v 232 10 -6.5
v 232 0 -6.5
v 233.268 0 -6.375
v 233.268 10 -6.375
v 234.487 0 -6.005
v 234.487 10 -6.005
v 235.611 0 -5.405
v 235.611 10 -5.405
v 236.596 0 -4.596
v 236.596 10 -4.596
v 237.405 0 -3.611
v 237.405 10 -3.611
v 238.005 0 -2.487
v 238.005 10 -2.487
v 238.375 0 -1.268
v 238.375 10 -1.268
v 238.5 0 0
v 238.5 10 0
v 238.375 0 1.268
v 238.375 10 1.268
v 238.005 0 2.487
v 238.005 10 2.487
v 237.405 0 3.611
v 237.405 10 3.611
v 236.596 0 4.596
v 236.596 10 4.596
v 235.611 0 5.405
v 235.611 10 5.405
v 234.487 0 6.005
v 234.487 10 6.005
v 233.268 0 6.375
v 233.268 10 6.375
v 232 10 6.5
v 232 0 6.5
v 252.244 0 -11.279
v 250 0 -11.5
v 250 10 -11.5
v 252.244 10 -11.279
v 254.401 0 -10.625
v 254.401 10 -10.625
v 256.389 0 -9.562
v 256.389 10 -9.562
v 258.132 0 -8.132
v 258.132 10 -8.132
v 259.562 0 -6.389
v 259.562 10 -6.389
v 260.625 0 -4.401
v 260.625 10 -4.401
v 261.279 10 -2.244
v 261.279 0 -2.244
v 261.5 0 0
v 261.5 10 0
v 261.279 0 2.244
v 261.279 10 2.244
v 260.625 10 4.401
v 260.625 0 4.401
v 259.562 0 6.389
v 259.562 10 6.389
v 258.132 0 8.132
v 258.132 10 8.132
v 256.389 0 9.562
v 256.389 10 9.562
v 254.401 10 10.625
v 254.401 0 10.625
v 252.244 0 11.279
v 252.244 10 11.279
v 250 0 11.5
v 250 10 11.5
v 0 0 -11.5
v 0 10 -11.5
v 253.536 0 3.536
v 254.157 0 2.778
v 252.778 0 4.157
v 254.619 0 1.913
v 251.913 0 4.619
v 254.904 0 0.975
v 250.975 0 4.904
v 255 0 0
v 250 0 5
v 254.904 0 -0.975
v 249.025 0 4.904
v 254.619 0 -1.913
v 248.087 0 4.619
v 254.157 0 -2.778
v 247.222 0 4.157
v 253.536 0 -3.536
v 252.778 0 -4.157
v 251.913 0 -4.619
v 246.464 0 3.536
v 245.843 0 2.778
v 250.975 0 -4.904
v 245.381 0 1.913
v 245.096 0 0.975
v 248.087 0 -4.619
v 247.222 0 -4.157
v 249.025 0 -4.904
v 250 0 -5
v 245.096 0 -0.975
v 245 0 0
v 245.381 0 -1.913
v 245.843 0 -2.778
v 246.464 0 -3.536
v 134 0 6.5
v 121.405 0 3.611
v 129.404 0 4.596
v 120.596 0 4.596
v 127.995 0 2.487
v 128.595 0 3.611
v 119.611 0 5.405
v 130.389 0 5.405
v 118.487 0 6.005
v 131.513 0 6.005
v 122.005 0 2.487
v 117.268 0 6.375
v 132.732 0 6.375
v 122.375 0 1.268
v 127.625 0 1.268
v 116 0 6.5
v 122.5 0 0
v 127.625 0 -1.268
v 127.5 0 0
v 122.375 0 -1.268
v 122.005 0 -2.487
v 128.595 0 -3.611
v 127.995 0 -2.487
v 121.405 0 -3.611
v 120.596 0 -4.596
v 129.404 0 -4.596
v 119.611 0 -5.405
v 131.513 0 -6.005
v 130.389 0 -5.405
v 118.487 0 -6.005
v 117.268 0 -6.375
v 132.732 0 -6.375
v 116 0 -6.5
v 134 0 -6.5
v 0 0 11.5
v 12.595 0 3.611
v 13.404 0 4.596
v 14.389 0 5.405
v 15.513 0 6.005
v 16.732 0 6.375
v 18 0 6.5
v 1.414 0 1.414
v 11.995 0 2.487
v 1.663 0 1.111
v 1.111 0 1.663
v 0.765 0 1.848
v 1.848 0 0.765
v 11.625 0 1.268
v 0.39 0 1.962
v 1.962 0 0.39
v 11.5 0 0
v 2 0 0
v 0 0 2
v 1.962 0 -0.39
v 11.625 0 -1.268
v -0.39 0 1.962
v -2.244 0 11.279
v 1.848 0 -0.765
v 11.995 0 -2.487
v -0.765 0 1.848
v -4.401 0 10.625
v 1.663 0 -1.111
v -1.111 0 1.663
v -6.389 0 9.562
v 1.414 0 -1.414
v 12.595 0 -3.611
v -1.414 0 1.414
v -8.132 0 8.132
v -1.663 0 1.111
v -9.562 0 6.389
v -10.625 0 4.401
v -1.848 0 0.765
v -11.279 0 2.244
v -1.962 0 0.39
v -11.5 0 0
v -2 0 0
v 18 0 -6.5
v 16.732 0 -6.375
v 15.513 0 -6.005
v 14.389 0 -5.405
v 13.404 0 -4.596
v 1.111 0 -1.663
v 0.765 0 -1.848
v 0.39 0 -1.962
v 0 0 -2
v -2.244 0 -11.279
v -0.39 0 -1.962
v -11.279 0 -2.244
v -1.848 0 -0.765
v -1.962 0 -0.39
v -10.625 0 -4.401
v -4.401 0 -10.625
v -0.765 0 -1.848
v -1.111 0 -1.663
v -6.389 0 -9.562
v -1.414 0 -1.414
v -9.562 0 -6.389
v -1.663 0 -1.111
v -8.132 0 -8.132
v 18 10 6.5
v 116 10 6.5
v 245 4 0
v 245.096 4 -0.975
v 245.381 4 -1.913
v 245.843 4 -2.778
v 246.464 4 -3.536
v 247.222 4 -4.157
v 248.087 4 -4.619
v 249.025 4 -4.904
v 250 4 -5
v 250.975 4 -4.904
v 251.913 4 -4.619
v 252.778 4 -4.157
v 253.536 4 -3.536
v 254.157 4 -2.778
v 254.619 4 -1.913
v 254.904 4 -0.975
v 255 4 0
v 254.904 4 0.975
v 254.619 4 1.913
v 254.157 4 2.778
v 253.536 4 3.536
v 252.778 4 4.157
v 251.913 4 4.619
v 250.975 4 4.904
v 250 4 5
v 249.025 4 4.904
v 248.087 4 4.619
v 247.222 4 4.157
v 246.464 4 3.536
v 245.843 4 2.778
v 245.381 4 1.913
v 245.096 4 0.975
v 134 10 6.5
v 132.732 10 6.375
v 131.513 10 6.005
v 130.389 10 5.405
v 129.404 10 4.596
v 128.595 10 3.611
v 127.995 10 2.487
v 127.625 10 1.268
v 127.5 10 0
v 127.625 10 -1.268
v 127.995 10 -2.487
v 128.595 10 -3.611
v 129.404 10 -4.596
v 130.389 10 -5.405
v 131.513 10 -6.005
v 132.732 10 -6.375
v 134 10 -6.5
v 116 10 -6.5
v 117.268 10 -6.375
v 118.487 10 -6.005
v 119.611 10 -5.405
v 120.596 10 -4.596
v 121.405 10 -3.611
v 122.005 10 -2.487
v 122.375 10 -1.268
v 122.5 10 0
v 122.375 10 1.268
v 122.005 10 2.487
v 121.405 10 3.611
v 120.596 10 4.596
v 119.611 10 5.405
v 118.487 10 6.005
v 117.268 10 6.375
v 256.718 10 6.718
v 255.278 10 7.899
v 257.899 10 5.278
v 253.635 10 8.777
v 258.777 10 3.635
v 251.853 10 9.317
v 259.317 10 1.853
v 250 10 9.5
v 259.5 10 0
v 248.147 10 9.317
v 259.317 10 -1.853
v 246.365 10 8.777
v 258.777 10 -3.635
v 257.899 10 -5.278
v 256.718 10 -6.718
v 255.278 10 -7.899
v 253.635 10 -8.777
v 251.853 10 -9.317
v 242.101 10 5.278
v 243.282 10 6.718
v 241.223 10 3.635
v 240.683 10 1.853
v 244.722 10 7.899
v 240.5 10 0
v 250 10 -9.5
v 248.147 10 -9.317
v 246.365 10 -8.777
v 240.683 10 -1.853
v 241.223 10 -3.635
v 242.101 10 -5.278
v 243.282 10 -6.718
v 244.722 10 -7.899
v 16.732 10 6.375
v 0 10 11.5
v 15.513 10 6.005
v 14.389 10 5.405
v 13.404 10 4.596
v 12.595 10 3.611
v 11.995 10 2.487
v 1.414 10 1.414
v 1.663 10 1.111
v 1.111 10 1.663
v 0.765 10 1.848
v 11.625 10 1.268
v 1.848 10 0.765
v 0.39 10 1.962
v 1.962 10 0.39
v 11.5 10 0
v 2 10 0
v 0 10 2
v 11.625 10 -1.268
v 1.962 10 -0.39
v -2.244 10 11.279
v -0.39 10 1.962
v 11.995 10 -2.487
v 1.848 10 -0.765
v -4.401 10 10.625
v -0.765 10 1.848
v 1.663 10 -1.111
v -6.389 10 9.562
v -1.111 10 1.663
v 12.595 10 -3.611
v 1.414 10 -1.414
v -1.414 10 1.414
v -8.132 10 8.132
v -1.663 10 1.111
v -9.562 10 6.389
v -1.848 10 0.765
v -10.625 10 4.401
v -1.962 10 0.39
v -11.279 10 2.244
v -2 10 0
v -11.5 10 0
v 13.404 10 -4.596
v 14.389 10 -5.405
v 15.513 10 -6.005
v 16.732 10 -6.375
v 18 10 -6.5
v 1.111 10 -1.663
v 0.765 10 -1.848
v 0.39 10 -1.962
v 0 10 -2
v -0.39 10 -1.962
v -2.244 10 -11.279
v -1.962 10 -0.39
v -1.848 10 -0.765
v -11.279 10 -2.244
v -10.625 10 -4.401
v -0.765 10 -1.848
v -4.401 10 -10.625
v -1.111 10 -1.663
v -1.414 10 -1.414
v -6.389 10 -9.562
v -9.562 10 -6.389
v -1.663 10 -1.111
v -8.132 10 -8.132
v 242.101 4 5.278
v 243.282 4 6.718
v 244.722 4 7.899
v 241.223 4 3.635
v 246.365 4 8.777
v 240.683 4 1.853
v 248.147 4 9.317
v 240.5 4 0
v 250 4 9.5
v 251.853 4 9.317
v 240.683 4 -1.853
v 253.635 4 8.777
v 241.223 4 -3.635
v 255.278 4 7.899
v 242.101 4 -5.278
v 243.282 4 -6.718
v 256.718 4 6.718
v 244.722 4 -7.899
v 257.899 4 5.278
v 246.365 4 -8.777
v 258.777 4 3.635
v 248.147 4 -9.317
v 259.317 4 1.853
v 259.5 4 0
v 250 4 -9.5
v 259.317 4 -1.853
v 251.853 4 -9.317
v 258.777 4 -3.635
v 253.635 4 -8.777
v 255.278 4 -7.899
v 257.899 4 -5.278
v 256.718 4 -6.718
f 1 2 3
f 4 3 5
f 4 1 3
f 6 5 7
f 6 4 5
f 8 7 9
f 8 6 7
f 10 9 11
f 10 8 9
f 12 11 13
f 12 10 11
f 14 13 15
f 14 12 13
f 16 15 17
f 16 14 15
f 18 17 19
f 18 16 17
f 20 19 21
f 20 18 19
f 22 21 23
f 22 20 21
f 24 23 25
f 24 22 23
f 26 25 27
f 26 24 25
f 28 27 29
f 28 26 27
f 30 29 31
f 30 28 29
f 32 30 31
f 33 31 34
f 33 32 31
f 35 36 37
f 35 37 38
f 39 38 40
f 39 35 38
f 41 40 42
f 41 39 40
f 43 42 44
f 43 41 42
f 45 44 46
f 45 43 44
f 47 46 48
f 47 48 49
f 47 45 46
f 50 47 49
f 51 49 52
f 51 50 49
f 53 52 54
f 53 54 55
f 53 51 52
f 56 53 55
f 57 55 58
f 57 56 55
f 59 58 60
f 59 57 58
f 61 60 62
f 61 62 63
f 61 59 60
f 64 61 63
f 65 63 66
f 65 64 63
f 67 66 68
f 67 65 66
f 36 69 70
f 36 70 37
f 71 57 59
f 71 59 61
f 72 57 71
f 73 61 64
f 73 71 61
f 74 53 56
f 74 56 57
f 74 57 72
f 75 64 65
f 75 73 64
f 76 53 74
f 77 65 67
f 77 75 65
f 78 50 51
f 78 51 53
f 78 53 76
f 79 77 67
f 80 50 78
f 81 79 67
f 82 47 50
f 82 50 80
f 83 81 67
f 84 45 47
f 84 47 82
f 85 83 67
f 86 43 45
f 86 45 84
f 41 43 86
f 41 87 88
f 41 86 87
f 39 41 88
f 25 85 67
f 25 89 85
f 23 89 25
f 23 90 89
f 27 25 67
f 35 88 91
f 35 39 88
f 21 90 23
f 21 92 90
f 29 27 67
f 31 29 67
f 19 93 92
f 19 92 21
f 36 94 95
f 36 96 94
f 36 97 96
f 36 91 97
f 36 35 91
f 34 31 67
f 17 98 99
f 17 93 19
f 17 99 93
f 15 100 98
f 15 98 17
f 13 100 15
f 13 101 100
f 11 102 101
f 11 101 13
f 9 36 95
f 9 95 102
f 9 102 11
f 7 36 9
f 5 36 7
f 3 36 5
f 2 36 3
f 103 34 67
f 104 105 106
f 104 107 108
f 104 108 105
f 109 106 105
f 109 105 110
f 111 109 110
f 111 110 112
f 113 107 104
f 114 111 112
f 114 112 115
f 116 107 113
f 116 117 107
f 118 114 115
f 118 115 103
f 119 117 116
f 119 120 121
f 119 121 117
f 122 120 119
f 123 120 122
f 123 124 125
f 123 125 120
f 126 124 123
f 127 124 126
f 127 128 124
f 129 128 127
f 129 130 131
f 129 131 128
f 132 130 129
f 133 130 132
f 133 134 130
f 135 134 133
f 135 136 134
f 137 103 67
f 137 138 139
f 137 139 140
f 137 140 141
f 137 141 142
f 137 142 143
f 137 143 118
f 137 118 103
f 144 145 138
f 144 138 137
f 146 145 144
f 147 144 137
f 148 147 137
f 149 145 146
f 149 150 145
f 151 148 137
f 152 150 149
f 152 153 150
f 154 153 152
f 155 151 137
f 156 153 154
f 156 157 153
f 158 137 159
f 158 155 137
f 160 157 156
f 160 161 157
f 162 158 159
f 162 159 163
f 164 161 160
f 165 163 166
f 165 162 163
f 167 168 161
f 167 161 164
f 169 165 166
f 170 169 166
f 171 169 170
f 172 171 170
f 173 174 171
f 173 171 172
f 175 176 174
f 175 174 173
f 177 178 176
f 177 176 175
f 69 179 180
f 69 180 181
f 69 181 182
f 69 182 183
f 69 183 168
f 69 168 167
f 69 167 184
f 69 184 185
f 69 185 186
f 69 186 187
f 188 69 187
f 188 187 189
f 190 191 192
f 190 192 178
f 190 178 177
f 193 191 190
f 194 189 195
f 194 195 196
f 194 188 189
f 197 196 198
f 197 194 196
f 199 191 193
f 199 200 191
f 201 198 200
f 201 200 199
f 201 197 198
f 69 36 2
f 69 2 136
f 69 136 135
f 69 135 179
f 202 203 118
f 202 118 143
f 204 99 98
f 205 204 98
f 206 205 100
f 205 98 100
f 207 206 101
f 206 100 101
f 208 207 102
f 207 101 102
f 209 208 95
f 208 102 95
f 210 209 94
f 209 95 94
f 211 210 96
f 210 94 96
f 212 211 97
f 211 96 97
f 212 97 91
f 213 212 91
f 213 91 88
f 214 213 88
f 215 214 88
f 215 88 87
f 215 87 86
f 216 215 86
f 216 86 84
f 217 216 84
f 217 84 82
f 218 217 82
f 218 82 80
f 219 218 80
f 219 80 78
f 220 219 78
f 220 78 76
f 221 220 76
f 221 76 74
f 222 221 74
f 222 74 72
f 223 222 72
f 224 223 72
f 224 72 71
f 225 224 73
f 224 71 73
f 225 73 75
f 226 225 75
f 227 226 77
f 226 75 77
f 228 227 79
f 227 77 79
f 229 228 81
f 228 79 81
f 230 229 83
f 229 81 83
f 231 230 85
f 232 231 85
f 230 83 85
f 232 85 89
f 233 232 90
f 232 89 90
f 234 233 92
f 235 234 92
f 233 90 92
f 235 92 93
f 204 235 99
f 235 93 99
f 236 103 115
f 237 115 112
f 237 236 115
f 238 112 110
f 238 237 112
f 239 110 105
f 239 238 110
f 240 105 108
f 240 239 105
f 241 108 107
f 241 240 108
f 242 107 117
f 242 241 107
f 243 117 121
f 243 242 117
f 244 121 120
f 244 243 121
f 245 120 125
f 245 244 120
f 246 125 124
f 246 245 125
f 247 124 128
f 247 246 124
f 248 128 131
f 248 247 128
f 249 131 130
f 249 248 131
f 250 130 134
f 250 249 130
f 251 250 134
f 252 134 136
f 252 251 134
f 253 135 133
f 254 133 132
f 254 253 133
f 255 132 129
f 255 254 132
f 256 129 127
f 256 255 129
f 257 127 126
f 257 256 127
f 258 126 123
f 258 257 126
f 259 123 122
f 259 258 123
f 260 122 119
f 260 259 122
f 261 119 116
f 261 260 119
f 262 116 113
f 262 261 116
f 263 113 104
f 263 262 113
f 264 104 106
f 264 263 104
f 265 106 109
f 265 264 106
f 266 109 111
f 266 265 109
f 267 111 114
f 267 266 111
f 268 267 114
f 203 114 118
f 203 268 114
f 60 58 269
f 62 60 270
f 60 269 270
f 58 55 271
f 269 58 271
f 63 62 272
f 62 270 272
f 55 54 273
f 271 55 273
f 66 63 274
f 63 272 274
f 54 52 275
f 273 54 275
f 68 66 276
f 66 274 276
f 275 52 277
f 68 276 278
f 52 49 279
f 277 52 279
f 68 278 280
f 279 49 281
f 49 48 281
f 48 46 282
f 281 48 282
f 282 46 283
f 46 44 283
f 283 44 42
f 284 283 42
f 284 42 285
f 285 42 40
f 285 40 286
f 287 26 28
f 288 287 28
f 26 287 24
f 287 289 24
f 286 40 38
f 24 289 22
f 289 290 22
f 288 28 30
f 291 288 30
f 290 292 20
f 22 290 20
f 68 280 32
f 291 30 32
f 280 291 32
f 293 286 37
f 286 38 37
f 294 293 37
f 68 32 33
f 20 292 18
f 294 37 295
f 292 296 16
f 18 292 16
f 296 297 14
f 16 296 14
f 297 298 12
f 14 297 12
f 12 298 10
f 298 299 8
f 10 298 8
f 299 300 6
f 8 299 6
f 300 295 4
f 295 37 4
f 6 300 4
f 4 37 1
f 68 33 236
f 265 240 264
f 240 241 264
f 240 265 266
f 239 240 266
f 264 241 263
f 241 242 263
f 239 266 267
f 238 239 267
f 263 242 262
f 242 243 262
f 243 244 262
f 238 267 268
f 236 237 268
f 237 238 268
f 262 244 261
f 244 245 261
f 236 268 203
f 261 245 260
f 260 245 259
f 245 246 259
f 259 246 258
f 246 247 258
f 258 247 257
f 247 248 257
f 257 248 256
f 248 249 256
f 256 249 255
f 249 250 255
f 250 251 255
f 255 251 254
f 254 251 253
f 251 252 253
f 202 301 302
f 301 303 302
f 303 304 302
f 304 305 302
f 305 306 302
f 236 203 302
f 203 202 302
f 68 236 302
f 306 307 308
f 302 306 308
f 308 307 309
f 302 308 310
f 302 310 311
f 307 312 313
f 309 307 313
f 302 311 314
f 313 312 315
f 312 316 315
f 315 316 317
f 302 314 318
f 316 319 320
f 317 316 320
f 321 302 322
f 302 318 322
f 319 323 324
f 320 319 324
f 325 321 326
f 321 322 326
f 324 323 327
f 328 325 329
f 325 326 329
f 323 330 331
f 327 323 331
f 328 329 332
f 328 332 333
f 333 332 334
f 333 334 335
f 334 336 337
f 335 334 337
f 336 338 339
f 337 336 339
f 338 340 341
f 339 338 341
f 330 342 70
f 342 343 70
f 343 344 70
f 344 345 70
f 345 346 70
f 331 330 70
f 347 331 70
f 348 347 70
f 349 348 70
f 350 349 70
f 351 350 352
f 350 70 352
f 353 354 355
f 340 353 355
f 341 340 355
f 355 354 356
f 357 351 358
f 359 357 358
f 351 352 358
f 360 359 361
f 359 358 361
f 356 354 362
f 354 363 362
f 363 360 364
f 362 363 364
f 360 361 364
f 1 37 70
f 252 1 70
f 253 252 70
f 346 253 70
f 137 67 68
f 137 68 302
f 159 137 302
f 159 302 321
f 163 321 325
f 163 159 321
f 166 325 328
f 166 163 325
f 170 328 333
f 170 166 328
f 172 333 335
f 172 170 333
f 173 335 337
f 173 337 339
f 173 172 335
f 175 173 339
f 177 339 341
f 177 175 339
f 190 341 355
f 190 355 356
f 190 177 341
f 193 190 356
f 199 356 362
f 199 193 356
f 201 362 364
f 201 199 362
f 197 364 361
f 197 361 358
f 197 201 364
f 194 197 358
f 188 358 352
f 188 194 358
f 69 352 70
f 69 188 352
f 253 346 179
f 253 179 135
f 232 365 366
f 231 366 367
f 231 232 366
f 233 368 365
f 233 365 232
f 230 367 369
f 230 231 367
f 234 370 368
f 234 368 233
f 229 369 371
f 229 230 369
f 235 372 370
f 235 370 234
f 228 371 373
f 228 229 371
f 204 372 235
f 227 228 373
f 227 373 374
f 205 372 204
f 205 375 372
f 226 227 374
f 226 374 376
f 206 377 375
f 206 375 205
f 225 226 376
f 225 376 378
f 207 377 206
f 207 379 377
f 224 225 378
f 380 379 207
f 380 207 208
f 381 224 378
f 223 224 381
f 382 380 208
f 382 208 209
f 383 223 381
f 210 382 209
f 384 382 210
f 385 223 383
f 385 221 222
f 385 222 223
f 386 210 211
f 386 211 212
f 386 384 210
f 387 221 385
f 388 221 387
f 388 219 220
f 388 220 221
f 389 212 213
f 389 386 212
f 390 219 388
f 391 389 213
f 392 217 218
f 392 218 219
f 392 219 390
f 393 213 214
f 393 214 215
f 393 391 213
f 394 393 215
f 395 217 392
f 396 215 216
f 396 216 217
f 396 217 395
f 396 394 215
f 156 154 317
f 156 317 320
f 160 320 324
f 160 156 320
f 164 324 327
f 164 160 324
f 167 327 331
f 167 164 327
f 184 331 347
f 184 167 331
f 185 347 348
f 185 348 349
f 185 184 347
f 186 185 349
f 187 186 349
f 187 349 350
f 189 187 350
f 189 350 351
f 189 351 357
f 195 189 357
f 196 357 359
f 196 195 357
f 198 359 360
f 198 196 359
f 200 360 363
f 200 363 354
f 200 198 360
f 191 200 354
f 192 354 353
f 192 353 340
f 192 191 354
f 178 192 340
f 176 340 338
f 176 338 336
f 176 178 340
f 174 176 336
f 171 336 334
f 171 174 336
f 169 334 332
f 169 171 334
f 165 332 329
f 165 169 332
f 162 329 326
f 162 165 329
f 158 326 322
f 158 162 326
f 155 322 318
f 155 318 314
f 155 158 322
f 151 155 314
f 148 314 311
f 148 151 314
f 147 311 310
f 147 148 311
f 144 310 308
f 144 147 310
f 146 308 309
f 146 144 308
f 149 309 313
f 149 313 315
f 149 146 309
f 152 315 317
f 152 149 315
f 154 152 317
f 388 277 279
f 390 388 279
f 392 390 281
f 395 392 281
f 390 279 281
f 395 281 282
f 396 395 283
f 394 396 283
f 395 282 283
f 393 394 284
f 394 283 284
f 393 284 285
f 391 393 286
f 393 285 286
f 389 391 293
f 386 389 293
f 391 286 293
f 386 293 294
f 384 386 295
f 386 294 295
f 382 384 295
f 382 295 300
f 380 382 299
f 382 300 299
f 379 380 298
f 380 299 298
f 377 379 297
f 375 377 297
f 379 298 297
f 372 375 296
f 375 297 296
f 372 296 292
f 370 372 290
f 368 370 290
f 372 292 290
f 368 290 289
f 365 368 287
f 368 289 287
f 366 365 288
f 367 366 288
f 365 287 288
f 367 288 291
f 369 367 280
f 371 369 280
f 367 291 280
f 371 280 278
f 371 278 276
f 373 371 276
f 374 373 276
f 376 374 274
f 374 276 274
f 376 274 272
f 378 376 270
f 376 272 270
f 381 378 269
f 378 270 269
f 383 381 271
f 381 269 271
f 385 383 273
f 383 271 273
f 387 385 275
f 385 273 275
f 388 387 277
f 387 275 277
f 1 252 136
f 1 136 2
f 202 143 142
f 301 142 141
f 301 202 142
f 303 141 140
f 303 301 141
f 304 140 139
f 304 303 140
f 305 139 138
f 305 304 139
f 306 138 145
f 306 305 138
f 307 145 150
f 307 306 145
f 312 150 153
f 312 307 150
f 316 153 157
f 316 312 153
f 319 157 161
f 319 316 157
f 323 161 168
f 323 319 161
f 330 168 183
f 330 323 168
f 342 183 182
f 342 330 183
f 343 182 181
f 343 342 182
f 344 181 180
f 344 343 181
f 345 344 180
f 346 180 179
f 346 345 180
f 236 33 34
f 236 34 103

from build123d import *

# Parameters (mm, degrees)
SKETCH1_R           = 2
BOSS_EXTRUDE1_DEPTH = 10
SKETCH2_R           = 9.5
CUT_EXTRUDE1_DEPTH  = 6
SKETCH3_R           = 5
CUT_EXTRUDE2_DEPTH  = 11
CUT_EXTRUDE3_DEPTH  = 11


with BuildPart() as part:
    # Sketch1 → Boss-Extrude1 (new body)
    with BuildSketch(Plane(origin=(0, 0, 0), x_dir=(1, 0, 0), z_dir=(0, 1, 0))):
        with BuildLine():
            Line((0, 11.5), (250, 11.5))
            ThreePointArc((250, 11.5), (261.5, 0), (250, -11.5))
            Line((250, -11.5), (0, -11.5))
            ThreePointArc((0, -11.5), (-11.5, 0), (0, 11.5))
        make_face()
        Circle(SKETCH1_R, mode=Mode.SUBTRACT)
    extrude(amount=BOSS_EXTRUDE1_DEPTH)

    # Sketch2 → Cut-Extrude1 (cut)
    with BuildSketch(Plane(origin=(0, 10, 0), x_dir=(1, 0, 0), z_dir=(0, 1, 0))):
        with Locations((250, 0)):
            Circle(SKETCH2_R)
    extrude(amount=-CUT_EXTRUDE1_DEPTH, mode=Mode.SUBTRACT)

    # Sketch3 → Cut-Extrude2 (cut, through all)
    with BuildSketch(Plane(origin=(0, 0, 0), x_dir=(-1, 0, 0), z_dir=(0, -1, 0))):
        with Locations((-250, 0)):
            Circle(SKETCH3_R)
    extrude(amount=-CUT_EXTRUDE2_DEPTH, mode=Mode.SUBTRACT)

    # Sketch4 → Cut-Extrude3 (cut, through all)
    with BuildSketch(Plane(origin=(0, 10, 0), x_dir=(1, 0, 0), z_dir=(0, 1, 0))):
        with BuildLine():
            Line((18, 6.5), (116, 6.5))
            ThreePointArc((116, 6.5), (122.5, 0), (116, -6.5))
            Line((116, -6.5), (18, -6.5))
            ThreePointArc((18, -6.5), (11.5, 0), (18, 6.5))
        make_face()
        with BuildLine():
            Line((134, 6.5), (232, 6.5))
            ThreePointArc((232, 6.5), (238.5, 0), (232, -6.5))
            Line((232, -6.5), (134, -6.5))
            ThreePointArc((134, -6.5), (127.5, 0), (134, 6.5))
        make_face()
    extrude(amount=-CUT_EXTRUDE3_DEPTH, mode=Mode.SUBTRACT)


solid = part.part
